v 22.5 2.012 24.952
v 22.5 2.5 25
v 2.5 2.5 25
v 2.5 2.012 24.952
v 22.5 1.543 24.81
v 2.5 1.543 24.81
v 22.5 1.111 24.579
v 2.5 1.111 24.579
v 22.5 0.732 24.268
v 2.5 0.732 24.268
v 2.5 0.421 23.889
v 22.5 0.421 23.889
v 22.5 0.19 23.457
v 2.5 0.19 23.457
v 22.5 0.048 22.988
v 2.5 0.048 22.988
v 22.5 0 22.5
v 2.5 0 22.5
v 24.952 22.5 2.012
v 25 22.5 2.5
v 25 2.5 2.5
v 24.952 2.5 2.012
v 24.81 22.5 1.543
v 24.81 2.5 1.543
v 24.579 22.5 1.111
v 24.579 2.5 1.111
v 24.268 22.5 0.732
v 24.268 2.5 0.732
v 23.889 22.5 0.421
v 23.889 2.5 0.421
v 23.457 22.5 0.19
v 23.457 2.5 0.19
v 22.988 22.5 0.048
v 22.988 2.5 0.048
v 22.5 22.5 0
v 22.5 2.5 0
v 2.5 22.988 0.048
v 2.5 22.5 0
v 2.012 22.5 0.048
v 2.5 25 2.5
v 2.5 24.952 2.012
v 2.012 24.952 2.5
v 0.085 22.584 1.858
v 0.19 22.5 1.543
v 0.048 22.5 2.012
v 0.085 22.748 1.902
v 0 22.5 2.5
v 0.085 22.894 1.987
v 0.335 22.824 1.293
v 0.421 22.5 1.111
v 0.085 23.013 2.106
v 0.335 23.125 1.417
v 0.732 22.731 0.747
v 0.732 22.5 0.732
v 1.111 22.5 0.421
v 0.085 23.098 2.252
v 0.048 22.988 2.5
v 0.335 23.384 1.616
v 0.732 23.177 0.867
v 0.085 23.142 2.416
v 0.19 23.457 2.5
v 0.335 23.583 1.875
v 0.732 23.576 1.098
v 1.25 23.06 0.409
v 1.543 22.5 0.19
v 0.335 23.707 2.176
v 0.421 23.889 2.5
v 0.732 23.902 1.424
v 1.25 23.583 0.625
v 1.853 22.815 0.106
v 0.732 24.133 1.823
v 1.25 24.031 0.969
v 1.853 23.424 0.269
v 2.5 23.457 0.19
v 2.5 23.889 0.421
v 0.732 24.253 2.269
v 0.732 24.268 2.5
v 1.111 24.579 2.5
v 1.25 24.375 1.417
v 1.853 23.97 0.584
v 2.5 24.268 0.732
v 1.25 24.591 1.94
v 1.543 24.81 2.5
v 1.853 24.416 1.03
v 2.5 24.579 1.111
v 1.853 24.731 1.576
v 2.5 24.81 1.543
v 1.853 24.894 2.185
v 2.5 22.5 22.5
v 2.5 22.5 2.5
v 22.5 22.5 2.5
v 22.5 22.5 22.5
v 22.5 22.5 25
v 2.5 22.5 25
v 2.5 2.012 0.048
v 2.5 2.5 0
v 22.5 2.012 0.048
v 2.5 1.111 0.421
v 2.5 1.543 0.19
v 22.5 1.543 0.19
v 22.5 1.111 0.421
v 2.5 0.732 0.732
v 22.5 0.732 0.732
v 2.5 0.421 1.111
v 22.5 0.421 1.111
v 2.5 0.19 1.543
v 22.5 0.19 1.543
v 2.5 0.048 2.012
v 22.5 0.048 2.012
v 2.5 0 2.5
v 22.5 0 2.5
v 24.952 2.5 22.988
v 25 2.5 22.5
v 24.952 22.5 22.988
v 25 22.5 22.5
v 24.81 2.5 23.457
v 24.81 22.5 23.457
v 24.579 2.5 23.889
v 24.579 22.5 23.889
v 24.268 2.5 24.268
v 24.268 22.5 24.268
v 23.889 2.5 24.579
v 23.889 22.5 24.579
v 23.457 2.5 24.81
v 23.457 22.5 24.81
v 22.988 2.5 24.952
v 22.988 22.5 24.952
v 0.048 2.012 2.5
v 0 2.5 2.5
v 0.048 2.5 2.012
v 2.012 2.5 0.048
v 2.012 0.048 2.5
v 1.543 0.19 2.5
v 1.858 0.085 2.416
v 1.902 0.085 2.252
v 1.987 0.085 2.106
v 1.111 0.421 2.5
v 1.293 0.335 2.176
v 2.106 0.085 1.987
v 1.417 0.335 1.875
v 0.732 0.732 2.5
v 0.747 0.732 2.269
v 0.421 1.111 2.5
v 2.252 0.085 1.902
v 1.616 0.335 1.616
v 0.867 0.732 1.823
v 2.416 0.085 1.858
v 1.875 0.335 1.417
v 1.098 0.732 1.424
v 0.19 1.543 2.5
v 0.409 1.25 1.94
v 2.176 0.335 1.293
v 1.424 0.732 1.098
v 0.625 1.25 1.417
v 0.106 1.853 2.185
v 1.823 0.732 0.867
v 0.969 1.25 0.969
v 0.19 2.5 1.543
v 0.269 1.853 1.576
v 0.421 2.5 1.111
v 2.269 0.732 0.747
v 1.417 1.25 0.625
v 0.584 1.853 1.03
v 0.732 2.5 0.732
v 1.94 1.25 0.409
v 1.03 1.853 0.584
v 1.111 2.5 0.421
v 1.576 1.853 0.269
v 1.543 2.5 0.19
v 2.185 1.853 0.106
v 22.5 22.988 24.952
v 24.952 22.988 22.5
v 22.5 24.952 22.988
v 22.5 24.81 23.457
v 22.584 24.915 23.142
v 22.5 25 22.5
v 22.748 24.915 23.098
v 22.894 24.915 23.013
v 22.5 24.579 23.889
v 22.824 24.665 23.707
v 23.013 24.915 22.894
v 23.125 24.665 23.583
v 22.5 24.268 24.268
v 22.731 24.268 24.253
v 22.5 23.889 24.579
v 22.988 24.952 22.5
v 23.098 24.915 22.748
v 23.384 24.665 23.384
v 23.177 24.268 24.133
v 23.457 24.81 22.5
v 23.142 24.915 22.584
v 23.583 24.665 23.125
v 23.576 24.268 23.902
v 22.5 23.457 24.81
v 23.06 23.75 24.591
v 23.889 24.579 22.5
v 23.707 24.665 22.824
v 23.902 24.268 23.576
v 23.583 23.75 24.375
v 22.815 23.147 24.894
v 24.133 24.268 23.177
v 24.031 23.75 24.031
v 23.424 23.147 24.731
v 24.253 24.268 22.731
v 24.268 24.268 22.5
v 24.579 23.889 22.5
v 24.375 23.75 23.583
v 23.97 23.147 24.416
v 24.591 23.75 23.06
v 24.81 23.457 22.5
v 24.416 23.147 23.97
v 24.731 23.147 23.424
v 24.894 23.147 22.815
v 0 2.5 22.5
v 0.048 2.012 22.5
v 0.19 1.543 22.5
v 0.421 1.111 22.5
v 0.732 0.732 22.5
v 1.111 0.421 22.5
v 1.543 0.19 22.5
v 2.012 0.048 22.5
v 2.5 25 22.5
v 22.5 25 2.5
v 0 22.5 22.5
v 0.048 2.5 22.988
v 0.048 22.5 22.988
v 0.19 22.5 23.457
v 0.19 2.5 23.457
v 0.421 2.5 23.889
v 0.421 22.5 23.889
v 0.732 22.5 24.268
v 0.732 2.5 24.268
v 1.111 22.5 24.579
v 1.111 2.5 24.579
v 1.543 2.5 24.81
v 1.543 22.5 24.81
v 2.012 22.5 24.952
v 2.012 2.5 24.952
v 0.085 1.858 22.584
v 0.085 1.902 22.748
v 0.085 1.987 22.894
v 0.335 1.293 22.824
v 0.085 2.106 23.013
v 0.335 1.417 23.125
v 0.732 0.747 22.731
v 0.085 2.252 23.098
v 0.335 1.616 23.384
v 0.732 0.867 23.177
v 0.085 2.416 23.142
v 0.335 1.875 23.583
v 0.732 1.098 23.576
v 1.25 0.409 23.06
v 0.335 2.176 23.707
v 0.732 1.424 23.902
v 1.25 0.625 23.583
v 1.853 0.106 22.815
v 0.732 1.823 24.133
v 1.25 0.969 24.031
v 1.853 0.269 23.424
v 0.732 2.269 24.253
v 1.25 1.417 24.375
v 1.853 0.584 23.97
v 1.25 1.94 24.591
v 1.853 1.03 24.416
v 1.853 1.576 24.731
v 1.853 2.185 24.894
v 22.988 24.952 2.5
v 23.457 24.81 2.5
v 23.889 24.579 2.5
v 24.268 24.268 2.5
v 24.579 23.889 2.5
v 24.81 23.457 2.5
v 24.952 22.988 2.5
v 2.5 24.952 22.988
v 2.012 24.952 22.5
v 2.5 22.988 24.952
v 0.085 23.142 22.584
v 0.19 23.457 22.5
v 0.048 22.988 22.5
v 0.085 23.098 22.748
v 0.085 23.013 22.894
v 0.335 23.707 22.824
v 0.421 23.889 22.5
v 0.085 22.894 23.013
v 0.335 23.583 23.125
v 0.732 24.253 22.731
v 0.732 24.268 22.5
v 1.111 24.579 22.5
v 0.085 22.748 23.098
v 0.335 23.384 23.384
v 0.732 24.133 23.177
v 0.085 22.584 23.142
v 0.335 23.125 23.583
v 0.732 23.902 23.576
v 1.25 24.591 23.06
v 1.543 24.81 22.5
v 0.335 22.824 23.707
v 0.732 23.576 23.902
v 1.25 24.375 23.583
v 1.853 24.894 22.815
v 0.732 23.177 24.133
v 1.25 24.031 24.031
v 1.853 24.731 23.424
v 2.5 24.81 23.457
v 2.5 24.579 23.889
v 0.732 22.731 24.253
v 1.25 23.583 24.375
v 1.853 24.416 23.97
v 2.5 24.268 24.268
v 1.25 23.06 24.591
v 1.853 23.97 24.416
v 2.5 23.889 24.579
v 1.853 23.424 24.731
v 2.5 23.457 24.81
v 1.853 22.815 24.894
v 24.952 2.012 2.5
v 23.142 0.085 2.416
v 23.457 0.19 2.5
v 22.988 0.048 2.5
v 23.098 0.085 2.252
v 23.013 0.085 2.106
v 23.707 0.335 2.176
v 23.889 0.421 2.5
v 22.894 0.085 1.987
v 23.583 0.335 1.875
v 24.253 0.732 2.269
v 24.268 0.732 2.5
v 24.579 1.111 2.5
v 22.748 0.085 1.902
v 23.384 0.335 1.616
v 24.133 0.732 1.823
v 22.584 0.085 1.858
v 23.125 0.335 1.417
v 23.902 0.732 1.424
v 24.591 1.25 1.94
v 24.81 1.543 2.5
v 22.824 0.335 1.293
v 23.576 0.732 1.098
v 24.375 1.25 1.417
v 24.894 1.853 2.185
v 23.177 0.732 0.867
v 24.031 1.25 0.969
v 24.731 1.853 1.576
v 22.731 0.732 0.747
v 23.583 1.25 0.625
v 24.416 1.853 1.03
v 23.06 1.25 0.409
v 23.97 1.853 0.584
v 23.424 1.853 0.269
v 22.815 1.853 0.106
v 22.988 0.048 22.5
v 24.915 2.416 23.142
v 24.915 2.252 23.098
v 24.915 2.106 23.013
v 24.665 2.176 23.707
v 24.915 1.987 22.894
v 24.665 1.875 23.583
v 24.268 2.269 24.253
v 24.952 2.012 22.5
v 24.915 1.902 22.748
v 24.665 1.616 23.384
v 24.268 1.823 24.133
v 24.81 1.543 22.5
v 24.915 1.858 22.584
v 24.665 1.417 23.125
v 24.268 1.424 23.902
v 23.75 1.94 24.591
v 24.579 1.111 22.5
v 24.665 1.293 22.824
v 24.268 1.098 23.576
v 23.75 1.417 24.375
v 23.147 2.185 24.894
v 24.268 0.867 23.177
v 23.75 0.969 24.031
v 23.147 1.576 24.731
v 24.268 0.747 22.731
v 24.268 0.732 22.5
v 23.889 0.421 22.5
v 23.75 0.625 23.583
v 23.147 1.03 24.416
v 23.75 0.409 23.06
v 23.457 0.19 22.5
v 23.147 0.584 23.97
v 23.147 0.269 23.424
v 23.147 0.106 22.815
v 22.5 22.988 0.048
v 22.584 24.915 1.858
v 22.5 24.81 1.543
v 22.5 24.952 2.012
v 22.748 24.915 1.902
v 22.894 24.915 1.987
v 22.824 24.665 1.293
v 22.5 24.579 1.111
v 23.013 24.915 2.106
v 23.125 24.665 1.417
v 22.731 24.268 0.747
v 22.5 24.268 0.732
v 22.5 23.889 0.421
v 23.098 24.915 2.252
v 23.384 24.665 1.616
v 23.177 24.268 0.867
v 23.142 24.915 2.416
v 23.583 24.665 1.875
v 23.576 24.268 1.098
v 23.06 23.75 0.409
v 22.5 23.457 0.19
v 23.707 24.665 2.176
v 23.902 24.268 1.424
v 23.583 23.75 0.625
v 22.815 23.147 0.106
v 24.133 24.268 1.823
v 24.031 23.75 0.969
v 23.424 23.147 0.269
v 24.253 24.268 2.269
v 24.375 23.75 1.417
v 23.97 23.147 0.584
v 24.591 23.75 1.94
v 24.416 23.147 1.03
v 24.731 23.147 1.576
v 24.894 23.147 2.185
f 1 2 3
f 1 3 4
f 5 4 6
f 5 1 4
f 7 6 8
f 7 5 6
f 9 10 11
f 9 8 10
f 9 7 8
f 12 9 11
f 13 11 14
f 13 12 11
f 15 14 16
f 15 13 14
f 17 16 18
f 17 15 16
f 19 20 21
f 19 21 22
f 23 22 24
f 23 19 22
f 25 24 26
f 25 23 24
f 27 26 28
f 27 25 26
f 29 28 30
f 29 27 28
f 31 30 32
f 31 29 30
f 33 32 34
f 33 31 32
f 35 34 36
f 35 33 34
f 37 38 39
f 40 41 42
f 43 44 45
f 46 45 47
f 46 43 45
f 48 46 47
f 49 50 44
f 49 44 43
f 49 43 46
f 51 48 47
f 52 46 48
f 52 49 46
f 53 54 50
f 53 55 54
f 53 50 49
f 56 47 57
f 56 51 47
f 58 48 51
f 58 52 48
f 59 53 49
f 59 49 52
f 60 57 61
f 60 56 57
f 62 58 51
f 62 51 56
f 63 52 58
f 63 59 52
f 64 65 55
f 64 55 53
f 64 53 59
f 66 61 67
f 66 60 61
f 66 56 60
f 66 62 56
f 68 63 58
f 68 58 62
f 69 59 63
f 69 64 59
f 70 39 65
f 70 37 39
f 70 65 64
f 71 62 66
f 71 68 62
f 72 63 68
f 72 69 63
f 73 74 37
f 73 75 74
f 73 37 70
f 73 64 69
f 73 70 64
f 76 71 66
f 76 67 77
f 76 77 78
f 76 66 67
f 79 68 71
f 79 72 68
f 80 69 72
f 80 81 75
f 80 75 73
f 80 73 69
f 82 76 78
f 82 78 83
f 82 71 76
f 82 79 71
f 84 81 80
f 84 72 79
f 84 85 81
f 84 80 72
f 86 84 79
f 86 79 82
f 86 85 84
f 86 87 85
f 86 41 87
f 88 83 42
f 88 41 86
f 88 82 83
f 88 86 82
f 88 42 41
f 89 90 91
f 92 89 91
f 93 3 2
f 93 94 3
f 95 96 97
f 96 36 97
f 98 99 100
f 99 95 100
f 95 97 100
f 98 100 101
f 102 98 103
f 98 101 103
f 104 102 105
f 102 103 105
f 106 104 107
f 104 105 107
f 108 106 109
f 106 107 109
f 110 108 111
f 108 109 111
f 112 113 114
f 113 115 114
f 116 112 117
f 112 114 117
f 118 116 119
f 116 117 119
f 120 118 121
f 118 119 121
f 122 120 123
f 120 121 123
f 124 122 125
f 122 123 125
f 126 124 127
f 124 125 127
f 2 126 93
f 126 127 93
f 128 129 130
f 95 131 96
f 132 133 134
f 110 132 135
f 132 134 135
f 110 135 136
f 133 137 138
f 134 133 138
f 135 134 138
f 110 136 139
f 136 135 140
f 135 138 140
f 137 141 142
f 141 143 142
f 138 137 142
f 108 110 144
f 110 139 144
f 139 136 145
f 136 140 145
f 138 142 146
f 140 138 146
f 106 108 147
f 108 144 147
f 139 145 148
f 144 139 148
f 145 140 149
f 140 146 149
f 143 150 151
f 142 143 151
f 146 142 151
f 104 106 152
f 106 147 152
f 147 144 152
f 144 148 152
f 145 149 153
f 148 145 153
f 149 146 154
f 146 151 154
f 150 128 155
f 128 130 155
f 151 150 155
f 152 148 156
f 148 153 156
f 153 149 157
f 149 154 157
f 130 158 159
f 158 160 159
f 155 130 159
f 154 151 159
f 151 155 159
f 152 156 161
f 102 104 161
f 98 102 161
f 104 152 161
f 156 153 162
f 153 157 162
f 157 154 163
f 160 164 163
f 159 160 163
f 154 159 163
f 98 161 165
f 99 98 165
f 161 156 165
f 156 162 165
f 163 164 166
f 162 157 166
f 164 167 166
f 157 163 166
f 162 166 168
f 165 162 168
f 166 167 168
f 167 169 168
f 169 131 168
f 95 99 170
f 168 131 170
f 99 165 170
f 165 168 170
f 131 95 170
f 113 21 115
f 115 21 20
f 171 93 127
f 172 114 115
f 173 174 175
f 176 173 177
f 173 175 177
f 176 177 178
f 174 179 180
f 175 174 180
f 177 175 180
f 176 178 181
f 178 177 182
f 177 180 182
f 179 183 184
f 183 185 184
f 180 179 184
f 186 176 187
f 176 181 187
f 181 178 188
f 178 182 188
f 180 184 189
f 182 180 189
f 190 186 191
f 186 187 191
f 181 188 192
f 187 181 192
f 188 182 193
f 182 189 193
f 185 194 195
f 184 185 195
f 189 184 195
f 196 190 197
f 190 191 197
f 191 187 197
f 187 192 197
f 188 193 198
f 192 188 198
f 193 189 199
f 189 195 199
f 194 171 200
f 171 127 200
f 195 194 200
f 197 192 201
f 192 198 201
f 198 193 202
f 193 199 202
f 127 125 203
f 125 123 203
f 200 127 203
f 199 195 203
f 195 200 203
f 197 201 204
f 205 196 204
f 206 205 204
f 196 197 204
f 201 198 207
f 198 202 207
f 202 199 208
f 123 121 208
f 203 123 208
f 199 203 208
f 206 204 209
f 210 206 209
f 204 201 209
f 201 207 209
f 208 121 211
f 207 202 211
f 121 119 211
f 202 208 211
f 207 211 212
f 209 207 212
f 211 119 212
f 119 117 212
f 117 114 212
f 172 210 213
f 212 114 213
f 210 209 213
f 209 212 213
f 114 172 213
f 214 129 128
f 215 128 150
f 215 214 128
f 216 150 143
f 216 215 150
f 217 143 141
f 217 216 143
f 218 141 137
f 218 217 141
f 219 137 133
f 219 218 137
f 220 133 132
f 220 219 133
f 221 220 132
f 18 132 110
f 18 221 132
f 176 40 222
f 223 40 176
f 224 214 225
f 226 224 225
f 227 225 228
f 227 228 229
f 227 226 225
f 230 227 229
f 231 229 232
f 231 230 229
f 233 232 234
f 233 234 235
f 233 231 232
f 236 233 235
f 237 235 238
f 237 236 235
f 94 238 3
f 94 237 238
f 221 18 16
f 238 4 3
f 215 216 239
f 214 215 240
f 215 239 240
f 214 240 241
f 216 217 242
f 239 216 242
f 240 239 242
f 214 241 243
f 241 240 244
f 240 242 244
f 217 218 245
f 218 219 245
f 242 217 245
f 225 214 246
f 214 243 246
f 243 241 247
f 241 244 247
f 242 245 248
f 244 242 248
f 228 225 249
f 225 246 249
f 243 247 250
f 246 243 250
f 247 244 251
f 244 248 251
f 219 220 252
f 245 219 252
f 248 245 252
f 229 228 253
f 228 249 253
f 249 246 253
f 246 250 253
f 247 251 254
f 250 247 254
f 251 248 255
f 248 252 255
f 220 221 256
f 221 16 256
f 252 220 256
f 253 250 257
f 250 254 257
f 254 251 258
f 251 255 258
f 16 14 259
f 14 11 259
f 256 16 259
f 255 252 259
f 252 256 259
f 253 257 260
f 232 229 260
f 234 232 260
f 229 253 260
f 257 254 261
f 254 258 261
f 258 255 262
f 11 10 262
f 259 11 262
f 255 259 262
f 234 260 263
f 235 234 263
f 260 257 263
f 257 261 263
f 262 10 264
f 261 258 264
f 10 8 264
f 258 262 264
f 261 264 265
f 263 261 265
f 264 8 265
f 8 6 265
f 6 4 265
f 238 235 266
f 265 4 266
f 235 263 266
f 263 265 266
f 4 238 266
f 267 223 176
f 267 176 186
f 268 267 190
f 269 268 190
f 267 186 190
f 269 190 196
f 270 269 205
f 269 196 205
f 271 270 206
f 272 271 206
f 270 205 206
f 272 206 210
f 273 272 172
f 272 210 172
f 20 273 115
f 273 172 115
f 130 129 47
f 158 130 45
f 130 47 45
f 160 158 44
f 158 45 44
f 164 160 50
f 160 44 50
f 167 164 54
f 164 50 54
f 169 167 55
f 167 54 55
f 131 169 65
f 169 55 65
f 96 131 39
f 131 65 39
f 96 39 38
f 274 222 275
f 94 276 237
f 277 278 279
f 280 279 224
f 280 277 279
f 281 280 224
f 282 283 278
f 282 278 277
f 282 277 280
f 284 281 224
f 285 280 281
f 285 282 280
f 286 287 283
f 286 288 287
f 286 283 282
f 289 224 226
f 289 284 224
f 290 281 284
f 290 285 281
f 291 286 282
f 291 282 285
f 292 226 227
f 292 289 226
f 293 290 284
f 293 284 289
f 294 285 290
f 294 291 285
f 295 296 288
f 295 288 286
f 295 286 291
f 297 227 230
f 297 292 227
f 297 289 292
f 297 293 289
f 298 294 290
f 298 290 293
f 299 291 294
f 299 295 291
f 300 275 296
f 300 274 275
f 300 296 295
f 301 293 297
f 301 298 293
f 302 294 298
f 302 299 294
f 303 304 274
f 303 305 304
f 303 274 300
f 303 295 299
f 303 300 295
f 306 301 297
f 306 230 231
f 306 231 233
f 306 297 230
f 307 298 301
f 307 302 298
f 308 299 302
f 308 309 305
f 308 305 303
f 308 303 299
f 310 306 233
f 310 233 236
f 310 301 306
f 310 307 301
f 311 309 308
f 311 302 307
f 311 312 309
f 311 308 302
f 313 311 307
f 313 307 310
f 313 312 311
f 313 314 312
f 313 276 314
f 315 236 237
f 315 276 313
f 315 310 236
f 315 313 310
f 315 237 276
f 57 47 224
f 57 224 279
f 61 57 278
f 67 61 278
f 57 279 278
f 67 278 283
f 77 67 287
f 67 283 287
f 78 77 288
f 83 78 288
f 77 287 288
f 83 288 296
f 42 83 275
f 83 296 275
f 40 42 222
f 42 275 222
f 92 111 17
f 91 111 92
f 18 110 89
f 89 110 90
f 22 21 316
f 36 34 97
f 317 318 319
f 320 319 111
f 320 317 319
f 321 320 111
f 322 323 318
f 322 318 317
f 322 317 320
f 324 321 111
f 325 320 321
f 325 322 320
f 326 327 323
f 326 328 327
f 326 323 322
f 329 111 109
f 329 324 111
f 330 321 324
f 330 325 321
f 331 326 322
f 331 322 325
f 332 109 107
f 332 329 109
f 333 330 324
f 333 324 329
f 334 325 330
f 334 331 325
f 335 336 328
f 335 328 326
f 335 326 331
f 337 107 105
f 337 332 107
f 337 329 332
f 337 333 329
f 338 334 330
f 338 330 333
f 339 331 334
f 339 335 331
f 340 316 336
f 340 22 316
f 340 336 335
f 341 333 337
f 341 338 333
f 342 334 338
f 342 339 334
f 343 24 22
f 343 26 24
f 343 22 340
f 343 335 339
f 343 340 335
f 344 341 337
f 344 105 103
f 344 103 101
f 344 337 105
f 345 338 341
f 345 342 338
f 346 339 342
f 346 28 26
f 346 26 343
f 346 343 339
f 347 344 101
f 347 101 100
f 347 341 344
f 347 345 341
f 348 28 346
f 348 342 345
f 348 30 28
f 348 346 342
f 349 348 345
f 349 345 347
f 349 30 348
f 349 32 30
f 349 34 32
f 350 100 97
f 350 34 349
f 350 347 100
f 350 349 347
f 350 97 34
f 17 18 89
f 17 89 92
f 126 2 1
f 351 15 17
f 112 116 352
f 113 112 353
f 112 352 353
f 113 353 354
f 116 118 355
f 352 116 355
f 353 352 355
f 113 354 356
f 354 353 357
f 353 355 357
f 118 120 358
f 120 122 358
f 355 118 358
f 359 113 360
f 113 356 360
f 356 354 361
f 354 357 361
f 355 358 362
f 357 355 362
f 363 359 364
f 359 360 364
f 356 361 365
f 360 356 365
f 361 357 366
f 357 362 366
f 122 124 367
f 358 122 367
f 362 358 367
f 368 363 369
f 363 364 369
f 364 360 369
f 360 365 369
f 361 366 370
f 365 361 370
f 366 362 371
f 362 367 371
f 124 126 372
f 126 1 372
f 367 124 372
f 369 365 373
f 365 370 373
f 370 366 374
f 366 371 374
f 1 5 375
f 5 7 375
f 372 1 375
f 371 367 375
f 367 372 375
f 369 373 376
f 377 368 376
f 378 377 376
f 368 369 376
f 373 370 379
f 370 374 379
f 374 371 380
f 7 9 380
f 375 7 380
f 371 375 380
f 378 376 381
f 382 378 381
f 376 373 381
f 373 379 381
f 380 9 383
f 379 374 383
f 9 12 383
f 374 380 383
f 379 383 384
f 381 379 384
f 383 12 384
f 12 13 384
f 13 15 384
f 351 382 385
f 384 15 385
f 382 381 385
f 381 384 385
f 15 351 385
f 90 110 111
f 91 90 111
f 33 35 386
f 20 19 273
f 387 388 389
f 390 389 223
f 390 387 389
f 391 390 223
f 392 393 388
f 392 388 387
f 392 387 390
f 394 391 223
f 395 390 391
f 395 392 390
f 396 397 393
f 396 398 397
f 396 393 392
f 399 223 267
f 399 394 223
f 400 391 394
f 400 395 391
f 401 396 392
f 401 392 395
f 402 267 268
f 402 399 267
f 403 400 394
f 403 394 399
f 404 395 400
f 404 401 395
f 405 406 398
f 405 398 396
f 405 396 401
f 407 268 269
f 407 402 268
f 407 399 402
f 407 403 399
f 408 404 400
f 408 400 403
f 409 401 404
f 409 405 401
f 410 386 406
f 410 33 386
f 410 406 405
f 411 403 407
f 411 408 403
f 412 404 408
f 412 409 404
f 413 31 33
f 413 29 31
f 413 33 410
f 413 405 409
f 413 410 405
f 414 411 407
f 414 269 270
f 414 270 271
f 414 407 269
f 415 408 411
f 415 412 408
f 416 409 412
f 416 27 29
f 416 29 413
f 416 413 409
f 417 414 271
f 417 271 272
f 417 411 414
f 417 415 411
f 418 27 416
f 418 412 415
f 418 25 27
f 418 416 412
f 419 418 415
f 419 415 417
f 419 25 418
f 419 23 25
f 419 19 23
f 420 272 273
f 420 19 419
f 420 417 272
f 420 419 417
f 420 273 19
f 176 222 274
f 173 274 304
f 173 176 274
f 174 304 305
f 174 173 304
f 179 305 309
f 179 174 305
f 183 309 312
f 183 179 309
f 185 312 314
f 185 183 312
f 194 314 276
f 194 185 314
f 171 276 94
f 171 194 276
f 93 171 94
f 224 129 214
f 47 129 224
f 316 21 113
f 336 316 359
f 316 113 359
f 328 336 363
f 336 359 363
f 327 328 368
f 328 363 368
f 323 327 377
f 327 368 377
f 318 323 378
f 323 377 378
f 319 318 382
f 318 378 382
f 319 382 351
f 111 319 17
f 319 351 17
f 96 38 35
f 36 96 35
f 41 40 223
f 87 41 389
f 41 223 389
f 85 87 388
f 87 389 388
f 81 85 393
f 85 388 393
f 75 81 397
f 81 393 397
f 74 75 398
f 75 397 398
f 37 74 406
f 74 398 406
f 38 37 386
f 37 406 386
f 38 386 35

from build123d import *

# Parameters (mm, degrees)
F0_W     = 25
F0_H     = 25
F1_DEPTH = 25
F2_T     = -2.5
F3_R     = 2.49999


# Not quite as in the source:
# - a fillet or chamfer is up to 0.001 mm smaller than in the source, because OpenCascade refuses the exact size


with BuildPart() as f1:
    # F0 (on Top) → F1 (new body)
    with BuildSketch(Plane.XY):
        with Locations((12.5, 12.5)):
            Rectangle(F0_W, F0_H)
    extrude(amount=F1_DEPTH)

    # F2
    f2_openings = [f1.faces().sort_by_distance(p)[0] for p in [
        (12.5, 0, 12.5),
    ]]
    offset(amount=F2_T, openings=f2_openings)

    # F3 (radius 2.5 in the source; OpenCascade refuses exactly that, so slightly less here)
    f3_edges = [f1.edges().sort_by_distance(p)[0] for p in [
        (12.5, 0, 25),
        (25, 12.5, 0),
        (12.5, 25, 0),
        (0, 12.5, 0),
        (25, 12.5, 25),
        (12.5, 25, 25),
        (0, 25, 12.5),
        (0, 0, 12.5),
        (0, 12.5, 25),
        (25, 0, 12.5),
        (25, 25, 12.5),
        (12.5, 0, 0),
    ]]
    fillet(f3_edges, radius=F3_R)


solid = f1.part
